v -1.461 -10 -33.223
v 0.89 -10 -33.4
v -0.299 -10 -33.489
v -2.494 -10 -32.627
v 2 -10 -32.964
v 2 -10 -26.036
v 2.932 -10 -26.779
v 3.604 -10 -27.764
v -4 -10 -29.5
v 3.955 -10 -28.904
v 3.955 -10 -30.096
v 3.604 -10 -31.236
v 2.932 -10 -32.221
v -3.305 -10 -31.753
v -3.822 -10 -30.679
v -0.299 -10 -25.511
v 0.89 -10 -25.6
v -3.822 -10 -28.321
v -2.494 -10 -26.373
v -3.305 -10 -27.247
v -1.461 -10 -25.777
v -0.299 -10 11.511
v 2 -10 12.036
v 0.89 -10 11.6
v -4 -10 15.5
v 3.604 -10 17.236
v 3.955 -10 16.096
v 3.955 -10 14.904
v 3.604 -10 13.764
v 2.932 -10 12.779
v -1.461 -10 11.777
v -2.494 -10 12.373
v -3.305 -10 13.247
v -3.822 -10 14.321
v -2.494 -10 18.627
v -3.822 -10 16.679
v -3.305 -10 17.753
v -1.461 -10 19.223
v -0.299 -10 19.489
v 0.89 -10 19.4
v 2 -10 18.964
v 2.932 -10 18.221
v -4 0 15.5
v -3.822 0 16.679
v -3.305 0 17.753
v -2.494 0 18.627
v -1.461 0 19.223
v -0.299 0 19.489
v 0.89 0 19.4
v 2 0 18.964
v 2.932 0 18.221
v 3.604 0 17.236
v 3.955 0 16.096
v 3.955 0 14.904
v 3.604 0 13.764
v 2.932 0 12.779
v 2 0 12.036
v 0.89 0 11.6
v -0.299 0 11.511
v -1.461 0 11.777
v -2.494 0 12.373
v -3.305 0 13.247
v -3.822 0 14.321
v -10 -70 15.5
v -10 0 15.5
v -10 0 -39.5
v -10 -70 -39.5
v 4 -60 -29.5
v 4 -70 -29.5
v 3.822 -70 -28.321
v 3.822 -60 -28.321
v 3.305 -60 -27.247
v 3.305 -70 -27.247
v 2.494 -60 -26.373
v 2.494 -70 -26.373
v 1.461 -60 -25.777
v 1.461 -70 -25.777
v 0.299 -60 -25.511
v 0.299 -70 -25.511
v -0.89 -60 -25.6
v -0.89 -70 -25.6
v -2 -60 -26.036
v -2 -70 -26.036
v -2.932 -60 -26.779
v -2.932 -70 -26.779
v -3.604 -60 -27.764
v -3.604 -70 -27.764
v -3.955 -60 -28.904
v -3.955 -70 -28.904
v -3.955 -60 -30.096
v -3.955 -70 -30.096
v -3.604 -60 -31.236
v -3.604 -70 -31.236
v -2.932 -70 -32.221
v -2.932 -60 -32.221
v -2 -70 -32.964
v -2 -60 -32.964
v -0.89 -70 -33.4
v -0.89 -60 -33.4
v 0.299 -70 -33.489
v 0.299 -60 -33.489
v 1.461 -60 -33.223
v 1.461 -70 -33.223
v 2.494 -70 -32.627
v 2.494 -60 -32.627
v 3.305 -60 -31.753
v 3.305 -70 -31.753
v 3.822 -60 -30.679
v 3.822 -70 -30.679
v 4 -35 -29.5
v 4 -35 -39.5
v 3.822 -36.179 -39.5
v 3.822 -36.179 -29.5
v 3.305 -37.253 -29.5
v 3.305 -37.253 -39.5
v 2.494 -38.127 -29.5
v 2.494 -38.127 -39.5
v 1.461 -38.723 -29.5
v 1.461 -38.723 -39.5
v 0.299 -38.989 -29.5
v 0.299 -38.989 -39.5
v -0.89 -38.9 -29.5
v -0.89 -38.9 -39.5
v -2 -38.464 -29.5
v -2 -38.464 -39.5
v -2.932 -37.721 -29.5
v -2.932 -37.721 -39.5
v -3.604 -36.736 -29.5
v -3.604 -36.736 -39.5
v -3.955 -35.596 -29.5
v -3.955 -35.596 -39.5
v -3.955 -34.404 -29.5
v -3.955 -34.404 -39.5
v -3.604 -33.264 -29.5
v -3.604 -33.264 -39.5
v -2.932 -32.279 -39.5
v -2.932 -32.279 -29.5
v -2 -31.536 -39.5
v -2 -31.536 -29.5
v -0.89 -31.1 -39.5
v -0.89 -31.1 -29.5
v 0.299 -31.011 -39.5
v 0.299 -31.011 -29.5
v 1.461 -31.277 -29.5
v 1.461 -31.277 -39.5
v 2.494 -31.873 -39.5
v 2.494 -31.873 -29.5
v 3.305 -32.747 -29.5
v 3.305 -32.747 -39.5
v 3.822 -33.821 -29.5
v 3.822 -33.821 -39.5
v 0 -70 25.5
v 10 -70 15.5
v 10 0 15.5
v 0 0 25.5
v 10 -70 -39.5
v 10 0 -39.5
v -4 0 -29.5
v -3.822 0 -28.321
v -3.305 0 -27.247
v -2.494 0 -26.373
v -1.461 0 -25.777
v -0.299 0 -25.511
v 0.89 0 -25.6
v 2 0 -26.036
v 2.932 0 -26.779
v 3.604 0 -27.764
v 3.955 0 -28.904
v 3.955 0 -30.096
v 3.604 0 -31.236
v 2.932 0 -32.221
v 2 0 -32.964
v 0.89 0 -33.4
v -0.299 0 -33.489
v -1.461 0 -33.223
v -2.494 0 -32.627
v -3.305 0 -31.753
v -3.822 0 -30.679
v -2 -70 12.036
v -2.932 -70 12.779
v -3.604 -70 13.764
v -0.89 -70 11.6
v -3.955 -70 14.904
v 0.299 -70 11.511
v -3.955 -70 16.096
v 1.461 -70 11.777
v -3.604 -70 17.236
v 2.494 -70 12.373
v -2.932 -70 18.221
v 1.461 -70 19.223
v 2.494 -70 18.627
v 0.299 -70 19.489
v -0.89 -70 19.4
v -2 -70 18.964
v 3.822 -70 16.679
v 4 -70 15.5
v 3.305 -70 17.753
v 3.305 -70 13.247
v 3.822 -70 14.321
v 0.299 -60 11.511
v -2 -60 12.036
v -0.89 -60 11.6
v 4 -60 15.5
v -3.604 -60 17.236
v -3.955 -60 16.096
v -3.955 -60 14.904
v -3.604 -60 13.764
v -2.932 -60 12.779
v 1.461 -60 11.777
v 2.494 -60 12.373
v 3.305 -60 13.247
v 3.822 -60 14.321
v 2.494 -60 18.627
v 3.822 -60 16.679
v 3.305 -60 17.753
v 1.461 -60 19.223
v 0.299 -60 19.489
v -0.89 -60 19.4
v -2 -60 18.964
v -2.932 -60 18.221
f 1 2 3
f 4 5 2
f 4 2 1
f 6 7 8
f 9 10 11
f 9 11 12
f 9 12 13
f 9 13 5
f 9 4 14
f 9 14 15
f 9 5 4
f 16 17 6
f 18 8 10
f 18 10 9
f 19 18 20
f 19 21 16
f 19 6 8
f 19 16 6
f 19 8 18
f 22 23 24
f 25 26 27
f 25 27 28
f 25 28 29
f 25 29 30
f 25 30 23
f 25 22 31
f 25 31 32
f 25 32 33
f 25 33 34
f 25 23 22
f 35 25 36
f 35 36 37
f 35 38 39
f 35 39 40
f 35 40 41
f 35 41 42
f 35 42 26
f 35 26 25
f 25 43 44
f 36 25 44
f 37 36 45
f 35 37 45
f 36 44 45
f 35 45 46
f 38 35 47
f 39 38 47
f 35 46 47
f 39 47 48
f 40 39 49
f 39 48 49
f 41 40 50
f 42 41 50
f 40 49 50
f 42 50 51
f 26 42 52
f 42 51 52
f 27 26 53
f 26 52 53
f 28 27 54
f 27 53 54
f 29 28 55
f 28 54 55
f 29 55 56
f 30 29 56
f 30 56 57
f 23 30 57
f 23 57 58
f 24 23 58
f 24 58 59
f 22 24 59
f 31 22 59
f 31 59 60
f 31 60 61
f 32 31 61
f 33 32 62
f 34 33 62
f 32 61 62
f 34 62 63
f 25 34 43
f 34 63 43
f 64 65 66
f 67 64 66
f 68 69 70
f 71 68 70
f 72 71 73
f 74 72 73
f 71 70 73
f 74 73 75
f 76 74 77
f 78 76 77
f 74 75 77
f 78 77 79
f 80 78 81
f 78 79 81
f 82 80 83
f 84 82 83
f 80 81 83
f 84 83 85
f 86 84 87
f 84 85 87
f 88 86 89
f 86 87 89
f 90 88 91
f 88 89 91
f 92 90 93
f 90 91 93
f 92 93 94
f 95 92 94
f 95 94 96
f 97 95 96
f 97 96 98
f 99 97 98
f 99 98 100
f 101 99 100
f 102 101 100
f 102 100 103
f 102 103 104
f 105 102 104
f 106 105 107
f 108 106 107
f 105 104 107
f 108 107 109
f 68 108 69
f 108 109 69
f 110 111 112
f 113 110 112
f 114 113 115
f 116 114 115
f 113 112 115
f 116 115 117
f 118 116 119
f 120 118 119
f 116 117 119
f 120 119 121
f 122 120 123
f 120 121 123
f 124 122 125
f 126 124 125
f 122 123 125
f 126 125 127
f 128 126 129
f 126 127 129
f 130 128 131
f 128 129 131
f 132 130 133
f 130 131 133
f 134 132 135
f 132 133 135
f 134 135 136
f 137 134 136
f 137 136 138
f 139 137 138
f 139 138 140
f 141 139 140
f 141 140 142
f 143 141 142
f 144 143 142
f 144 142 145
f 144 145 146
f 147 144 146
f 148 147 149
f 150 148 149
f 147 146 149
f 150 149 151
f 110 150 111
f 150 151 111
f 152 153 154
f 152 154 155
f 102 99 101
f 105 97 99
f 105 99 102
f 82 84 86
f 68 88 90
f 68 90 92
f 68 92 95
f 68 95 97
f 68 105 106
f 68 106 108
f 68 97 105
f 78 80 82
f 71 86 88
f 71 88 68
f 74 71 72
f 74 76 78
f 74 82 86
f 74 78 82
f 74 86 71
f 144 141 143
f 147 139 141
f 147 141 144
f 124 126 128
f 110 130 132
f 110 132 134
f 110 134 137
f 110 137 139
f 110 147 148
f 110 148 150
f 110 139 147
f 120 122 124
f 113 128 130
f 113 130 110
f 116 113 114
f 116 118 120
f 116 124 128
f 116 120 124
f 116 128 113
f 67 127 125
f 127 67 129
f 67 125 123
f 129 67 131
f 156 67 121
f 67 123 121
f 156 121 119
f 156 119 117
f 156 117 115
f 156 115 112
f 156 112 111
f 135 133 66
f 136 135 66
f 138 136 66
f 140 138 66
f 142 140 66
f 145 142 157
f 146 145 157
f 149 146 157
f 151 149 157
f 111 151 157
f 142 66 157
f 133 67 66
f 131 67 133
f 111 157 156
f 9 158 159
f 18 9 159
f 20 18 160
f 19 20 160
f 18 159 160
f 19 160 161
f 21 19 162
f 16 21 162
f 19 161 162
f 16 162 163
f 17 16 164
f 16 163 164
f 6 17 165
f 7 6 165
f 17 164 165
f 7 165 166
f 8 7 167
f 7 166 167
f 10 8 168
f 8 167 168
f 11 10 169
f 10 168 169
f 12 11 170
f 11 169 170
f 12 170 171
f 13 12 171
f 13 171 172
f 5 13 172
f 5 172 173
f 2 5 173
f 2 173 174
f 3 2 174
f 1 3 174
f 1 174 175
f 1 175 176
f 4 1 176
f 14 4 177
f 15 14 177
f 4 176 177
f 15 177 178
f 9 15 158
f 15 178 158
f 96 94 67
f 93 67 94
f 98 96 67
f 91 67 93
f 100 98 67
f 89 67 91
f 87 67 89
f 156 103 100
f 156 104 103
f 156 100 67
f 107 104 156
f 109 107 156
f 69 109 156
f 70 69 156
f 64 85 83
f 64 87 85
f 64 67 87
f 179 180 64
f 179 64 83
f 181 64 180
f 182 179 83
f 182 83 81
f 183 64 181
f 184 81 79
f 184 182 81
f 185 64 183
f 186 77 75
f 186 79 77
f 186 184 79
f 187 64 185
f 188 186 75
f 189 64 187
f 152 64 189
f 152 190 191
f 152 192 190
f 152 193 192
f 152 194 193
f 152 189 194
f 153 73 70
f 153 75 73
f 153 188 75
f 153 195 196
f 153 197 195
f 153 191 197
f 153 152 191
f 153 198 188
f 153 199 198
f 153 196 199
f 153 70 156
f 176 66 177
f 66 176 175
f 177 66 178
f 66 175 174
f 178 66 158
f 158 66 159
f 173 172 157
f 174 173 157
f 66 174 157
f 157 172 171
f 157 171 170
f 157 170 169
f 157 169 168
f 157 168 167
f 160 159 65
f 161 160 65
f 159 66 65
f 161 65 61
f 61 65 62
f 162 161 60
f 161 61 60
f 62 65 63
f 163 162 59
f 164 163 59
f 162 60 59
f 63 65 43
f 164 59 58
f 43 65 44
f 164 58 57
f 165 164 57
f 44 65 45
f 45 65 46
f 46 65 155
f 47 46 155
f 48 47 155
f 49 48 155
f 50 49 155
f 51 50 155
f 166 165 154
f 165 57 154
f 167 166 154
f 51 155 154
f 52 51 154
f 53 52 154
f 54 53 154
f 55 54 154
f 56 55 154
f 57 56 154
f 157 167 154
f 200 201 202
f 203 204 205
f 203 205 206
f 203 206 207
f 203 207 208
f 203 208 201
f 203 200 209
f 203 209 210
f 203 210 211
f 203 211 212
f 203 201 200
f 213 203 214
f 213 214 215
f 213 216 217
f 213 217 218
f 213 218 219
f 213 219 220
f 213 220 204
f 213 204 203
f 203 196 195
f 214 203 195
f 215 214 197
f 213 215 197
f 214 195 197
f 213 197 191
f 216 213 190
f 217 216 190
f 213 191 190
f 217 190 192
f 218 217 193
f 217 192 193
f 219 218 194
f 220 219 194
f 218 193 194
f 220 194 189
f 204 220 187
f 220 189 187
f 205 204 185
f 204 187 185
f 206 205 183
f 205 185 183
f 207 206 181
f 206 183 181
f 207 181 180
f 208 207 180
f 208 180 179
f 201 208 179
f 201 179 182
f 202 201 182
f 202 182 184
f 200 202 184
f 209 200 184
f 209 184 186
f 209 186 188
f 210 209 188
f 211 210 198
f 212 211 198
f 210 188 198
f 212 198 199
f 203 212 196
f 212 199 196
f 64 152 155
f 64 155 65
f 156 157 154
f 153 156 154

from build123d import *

# Parameters (mm, degrees)
F1_DEPTH  = 70
F2_R      = 4
F3_DEPTH  = 10
F4_R      = 4
F5_DEPTH  = 10
F6_R      = 4
F7_DEPTH  = 10
F8_R      = 4
F9_DEPTH  = 10
F10_R     = 4
F11_DEPTH = 10


with BuildPart() as f1:
    # F0 (on Front) → F1 (new body)
    with BuildSketch(Plane.XZ):
        Polygon((0, 25.5), (-10, 15.5), (-10, -39.5), (10, -39.5), (10, 15.5), align=None)
    extrude(amount=F1_DEPTH)

    # F2 (on face) → F3 (cut)
    with BuildSketch(Plane.XZ.offset(70)):
        with Locations((0, -29.5)):
            Circle(F2_R)
    extrude(amount=-F3_DEPTH, mode=Mode.SUBTRACT)

    # F4 (on face) → F5 (cut)
    with BuildSketch(Plane.XZ.offset(70)):
        with Locations((0, 15.5)):
            Circle(F4_R)
    extrude(amount=-F5_DEPTH, mode=Mode.SUBTRACT)

    # F6 (on face) → F7 (cut)
    with BuildSketch(Plane(origin=(0, 0, 0), x_dir=(-1, 0, 0), z_dir=(0, 1, 0))):
        with Locations((0, -29.5)):
            Circle(F6_R)
    extrude(amount=-F7_DEPTH, mode=Mode.SUBTRACT)

    # F8 (on face) → F9 (cut)
    with BuildSketch(Plane(origin=(0, 0, 0), x_dir=(-1, 0, 0), z_dir=(0, 1, 0))):
        with Locations((0, 15.5)):
            Circle(F8_R)
    extrude(amount=-F9_DEPTH, mode=Mode.SUBTRACT)

    # F10 (on face) → F11 (cut)
    with BuildSketch(Plane(origin=(0, 0, -39.5), x_dir=(1, 0, 0), z_dir=(0, 0, -1))):
        with Locations((0, 35)):
            Circle(F10_R)
    extrude(amount=-F11_DEPTH, mode=Mode.SUBTRACT)


solid = f1.part
